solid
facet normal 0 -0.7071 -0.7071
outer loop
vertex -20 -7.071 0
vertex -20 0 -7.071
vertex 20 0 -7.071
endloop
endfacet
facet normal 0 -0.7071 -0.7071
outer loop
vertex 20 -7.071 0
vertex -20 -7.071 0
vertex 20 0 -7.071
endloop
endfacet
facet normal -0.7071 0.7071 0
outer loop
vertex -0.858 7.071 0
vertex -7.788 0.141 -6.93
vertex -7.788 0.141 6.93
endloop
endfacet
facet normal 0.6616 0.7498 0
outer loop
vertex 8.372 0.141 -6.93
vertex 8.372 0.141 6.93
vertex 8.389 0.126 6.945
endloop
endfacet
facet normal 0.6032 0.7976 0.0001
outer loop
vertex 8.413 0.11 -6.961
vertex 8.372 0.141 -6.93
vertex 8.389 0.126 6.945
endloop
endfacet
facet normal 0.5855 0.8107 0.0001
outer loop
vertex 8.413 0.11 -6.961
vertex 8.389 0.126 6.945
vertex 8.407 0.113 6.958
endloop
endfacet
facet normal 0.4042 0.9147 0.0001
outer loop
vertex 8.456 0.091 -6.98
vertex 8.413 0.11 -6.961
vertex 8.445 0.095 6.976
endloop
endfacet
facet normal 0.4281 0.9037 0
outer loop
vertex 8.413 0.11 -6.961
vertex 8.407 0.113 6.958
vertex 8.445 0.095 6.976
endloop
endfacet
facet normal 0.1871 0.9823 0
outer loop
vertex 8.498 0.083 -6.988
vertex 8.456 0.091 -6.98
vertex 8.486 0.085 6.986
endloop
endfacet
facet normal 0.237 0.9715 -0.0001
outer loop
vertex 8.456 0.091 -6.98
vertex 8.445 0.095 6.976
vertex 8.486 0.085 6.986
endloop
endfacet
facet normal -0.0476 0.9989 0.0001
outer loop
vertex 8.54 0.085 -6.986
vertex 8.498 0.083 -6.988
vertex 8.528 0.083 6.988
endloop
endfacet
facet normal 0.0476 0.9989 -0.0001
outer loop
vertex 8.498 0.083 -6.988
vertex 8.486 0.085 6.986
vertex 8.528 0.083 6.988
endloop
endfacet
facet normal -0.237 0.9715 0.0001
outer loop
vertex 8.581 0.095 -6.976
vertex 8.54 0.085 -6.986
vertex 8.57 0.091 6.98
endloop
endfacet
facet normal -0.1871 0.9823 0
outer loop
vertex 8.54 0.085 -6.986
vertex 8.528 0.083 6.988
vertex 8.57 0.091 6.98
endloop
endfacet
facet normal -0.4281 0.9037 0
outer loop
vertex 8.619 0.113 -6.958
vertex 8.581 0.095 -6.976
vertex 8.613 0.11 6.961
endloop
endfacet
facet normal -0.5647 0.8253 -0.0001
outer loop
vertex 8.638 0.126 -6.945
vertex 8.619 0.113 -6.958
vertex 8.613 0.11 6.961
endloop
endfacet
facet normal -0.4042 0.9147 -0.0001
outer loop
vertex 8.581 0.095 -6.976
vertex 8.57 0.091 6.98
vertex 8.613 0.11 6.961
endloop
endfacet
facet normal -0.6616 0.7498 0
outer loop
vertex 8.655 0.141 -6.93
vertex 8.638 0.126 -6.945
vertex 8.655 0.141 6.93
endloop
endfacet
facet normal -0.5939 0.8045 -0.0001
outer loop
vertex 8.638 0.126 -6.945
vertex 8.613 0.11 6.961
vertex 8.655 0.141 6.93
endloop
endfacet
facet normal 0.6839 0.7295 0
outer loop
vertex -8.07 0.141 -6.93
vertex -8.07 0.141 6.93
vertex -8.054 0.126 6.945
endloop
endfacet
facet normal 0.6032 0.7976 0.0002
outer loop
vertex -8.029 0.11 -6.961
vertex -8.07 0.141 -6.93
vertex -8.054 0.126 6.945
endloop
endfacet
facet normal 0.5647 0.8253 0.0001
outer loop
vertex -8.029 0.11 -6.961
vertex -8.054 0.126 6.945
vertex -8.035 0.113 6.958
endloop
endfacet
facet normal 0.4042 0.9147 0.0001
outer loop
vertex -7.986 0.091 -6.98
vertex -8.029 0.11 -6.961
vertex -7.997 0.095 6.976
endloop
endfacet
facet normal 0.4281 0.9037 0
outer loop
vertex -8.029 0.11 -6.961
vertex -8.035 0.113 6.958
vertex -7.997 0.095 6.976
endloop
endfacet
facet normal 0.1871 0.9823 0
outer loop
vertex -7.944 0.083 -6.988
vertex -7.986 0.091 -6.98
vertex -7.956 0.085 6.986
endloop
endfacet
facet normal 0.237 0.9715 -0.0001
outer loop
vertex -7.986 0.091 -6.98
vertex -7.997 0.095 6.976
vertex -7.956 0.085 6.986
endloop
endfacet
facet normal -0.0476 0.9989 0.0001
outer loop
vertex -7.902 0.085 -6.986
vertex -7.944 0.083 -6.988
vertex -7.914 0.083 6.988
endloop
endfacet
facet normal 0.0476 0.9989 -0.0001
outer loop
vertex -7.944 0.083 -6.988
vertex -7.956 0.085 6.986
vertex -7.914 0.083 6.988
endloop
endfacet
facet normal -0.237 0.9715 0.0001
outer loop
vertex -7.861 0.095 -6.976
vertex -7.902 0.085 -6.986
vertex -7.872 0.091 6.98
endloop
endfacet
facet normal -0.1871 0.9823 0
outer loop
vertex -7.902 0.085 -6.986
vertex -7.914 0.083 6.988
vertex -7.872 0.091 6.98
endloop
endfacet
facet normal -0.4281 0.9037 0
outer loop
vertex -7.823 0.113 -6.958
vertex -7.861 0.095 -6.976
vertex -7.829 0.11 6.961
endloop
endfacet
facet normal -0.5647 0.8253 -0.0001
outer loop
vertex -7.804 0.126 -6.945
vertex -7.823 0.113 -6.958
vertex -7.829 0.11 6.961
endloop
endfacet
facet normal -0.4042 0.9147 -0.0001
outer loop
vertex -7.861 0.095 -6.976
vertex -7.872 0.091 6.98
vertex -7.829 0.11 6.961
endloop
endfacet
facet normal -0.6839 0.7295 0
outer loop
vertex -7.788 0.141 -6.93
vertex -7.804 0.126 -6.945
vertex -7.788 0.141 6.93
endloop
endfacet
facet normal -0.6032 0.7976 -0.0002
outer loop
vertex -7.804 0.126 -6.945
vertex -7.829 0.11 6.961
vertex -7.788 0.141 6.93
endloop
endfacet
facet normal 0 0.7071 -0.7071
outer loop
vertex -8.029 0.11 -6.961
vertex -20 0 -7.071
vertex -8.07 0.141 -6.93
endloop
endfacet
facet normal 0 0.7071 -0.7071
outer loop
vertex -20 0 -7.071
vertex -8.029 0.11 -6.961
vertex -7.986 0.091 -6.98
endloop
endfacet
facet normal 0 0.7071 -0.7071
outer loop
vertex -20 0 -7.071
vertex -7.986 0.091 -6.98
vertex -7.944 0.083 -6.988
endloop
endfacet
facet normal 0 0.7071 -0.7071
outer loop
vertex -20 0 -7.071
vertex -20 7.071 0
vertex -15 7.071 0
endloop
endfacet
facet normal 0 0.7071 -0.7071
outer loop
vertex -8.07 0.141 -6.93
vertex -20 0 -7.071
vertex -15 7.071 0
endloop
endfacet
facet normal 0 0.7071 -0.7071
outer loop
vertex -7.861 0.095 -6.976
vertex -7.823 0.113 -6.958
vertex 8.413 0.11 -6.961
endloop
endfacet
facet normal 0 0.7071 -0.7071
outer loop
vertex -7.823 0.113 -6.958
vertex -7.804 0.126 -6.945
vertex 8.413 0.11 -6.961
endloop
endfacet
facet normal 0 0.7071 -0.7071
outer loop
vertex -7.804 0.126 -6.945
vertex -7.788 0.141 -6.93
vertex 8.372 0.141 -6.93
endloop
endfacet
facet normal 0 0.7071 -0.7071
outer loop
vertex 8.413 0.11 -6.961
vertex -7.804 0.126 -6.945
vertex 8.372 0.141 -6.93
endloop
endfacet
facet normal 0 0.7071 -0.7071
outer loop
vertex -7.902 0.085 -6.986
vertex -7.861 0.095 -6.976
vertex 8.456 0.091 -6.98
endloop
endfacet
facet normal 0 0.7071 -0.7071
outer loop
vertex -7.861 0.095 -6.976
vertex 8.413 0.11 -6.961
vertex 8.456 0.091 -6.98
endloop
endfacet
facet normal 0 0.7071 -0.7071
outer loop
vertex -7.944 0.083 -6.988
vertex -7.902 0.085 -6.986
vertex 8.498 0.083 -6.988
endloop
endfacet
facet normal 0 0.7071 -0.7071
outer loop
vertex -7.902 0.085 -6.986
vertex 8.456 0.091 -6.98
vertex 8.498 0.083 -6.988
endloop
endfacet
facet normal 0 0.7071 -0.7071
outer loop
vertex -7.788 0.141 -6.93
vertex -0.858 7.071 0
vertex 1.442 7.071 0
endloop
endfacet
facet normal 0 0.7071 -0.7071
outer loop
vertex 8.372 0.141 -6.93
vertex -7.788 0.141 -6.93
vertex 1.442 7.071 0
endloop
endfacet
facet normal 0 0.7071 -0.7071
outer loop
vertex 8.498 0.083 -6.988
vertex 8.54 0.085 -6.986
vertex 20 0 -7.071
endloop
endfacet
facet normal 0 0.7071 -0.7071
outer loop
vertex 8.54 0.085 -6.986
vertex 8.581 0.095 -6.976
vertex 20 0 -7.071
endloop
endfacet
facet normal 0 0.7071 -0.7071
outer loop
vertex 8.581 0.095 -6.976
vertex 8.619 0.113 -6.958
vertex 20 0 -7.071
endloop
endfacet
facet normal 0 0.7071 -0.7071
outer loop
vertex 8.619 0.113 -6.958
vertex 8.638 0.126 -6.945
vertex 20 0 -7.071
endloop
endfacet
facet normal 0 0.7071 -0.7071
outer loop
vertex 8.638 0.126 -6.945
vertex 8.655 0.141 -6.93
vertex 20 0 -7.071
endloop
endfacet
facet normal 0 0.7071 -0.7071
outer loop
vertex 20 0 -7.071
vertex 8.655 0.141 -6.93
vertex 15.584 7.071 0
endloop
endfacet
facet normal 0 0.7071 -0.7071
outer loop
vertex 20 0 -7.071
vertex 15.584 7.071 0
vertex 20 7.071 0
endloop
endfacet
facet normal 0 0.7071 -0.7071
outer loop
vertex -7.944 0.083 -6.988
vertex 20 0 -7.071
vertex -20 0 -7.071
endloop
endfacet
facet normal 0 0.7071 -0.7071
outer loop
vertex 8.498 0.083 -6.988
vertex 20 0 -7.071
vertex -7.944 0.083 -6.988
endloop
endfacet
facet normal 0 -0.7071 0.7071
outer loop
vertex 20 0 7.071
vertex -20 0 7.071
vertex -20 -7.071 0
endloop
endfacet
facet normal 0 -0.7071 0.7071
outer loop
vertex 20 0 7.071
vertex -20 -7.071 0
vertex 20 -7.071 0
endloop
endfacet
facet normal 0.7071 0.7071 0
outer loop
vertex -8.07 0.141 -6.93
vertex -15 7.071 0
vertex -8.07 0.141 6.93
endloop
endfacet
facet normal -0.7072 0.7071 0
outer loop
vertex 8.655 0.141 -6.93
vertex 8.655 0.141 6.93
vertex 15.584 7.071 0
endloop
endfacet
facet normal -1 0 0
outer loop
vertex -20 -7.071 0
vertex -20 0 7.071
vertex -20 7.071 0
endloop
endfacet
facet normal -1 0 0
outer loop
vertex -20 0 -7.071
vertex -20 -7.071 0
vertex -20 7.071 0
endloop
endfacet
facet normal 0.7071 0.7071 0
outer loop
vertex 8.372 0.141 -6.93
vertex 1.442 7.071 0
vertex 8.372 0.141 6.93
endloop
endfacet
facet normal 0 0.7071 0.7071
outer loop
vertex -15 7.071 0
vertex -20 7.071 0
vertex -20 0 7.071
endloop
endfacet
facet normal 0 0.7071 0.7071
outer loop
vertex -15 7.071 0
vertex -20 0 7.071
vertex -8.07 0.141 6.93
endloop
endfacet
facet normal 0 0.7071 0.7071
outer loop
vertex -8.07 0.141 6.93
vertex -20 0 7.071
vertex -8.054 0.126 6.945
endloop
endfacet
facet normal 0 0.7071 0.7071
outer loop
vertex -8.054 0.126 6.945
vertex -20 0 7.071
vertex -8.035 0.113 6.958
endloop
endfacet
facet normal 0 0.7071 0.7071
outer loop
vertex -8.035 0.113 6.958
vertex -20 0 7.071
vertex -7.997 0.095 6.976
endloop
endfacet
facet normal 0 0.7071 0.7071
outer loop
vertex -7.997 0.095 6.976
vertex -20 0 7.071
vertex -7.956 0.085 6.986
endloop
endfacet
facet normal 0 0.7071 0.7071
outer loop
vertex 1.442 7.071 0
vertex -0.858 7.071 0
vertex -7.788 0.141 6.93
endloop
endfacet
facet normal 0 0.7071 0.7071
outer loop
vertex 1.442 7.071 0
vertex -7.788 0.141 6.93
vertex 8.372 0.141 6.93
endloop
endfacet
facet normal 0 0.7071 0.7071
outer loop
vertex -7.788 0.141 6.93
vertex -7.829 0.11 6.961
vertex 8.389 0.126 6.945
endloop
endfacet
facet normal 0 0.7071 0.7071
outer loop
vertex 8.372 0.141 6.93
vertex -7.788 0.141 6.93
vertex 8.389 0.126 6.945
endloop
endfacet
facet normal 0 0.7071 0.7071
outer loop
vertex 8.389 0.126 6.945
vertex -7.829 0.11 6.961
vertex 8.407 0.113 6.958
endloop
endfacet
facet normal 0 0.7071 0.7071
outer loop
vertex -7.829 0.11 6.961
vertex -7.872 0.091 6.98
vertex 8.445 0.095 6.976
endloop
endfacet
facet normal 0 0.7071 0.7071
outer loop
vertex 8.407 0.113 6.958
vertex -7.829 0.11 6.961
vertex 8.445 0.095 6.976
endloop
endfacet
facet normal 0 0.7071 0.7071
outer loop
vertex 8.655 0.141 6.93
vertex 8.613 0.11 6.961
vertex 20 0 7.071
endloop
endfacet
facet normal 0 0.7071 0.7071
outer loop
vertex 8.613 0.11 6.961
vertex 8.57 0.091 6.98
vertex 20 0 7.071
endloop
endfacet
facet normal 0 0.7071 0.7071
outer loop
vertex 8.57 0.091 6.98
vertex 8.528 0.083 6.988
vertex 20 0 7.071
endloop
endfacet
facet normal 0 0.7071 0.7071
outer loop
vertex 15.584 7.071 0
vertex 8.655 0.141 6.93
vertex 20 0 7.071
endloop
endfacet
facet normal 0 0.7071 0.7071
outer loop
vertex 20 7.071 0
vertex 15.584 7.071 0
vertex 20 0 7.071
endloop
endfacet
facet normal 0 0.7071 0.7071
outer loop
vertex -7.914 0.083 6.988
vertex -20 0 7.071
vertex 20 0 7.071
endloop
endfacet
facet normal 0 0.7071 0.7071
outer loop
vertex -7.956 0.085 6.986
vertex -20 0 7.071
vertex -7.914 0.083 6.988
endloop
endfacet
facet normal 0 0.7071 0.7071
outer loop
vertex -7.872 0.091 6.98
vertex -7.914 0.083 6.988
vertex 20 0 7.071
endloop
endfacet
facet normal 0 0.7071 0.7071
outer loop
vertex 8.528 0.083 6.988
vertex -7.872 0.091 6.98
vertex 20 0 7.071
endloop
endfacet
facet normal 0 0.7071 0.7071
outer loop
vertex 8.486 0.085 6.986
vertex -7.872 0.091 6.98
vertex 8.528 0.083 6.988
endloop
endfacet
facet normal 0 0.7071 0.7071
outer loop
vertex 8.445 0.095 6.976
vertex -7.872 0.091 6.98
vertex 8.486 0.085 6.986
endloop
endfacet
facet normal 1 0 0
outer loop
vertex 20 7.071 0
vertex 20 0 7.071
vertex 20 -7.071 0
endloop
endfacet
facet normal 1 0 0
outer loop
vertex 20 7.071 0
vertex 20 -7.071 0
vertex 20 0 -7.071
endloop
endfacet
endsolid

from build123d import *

# Parameters (mm, degrees)
F0_W        = 40
F0_H        = 10
F2_DEPTH    = 5
F3_ANGLE    = 45
F5_DEPTH    = 12.5
F6_T4_DEPTH = 15.1421356237
F7_T4_DEPTH = 15.1421356237


# Not quite as in the source:
# - a fillet or chamfer that OpenCascade refuses, or shapes differently, is made with other operations: its cross-section is extruded or revolved along the edge and cut away or added
# - a feature names something its author has since deleted; it is built from what else it names


with BuildPart() as f2:
    # F0 (on Top) → F2 (new body, symmetric)
    with BuildSketch(Plane.XY):
        Rectangle(F0_W, F0_H)
    extrude(amount=F2_DEPTH, both=True)


with BuildPart() as f2_1:
    # F3: moved
    add(f2.part.rotate(Axis((0, 0, 0), (-1, 0, 0)), F3_ANGLE))

    # F4 (on offset) → F5 (cut, symmetric)
    with BuildSketch(Plane.XY.offset(5)):
        Polygon((-0.8578643763, 7.0710678119), (-15, 7.0710678119), (-7.9289321881, 0), align=None)
        Polygon((15.5842712475, 7.0710678119), (1.4421356237, 7.0710678119), (8.5132034356, 0), align=None)
    extrude(amount=F5_DEPTH, both=True, mode=Mode.SUBTRACT)

    # F6: fillet of radius 0.2 on 1 edges, made by hand


with BuildPart() as f6_tool2:
    # F6_s3 → F6_t4 (new body)
    with BuildSketch(Plane.XY.offset(7.5710678119)):
        with BuildLine():
            ThreePointArc((-8.0703535444, 0.1414213562), (-7.9289321881, 0.0828427125), (-7.7875108319, 0.1414213562))
            Line((-7.7875108319, 0.1414213562), (-7.9289321881, 0))
            Line((-7.9289321881, 0), (-8.0703535444, 0.1414213562))
        make_face()
    extrude(amount=-F6_T4_DEPTH)

    split(bisect_by=Plane(origin=(0, 3.5355339059, 3.5355339059), x_dir=(1, 0, 0), z_dir=(0, -0.7071067812, -0.7071067812)), keep=Keep.TOP)

    split(bisect_by=Plane(origin=(0, 3.5355339059, -3.5355339059), x_dir=(1, 0, 0), z_dir=(0, -0.7071067812, 0.7071067812)), keep=Keep.TOP)


with BuildPart() as f2_2:
    add(f2_1.part)

    # F6_t1: union F6_tool2
    add(f6_tool2.part)

    # F7: fillet of radius 0.2 on 1 edges, made by hand


with BuildPart() as f7_tool2:
    # F7_s3 → F7_t4 (new body)
    with BuildSketch(Plane.XY.offset(7.5710678119)):
        with BuildLine():
            ThreePointArc((8.3717820794, 0.1414213562), (8.5132034356, 0.0828427125), (8.6546247918, 0.1414213562))
            Line((8.6546247918, 0.1414213562), (8.5132034356, 0))
            Line((8.5132034356, 0), (8.3717820794, 0.1414213562))
        make_face()
    extrude(amount=-F7_T4_DEPTH)

    split(bisect_by=Plane(origin=(0, 3.5355339059, -3.5355339059), x_dir=(1, 0, 0), z_dir=(0, -0.7071067812, 0.7071067812)), keep=Keep.TOP)

    split(bisect_by=Plane(origin=(0, 3.5355339059, 3.5355339059), x_dir=(1, 0, 0), z_dir=(0, -0.7071067812, -0.7071067812)), keep=Keep.TOP)


with BuildPart() as f2_3:
    add(f2_2.part)

    # F7_t1: union F7_tool2
    add(f7_tool2.part)


solid = f2_3.part
